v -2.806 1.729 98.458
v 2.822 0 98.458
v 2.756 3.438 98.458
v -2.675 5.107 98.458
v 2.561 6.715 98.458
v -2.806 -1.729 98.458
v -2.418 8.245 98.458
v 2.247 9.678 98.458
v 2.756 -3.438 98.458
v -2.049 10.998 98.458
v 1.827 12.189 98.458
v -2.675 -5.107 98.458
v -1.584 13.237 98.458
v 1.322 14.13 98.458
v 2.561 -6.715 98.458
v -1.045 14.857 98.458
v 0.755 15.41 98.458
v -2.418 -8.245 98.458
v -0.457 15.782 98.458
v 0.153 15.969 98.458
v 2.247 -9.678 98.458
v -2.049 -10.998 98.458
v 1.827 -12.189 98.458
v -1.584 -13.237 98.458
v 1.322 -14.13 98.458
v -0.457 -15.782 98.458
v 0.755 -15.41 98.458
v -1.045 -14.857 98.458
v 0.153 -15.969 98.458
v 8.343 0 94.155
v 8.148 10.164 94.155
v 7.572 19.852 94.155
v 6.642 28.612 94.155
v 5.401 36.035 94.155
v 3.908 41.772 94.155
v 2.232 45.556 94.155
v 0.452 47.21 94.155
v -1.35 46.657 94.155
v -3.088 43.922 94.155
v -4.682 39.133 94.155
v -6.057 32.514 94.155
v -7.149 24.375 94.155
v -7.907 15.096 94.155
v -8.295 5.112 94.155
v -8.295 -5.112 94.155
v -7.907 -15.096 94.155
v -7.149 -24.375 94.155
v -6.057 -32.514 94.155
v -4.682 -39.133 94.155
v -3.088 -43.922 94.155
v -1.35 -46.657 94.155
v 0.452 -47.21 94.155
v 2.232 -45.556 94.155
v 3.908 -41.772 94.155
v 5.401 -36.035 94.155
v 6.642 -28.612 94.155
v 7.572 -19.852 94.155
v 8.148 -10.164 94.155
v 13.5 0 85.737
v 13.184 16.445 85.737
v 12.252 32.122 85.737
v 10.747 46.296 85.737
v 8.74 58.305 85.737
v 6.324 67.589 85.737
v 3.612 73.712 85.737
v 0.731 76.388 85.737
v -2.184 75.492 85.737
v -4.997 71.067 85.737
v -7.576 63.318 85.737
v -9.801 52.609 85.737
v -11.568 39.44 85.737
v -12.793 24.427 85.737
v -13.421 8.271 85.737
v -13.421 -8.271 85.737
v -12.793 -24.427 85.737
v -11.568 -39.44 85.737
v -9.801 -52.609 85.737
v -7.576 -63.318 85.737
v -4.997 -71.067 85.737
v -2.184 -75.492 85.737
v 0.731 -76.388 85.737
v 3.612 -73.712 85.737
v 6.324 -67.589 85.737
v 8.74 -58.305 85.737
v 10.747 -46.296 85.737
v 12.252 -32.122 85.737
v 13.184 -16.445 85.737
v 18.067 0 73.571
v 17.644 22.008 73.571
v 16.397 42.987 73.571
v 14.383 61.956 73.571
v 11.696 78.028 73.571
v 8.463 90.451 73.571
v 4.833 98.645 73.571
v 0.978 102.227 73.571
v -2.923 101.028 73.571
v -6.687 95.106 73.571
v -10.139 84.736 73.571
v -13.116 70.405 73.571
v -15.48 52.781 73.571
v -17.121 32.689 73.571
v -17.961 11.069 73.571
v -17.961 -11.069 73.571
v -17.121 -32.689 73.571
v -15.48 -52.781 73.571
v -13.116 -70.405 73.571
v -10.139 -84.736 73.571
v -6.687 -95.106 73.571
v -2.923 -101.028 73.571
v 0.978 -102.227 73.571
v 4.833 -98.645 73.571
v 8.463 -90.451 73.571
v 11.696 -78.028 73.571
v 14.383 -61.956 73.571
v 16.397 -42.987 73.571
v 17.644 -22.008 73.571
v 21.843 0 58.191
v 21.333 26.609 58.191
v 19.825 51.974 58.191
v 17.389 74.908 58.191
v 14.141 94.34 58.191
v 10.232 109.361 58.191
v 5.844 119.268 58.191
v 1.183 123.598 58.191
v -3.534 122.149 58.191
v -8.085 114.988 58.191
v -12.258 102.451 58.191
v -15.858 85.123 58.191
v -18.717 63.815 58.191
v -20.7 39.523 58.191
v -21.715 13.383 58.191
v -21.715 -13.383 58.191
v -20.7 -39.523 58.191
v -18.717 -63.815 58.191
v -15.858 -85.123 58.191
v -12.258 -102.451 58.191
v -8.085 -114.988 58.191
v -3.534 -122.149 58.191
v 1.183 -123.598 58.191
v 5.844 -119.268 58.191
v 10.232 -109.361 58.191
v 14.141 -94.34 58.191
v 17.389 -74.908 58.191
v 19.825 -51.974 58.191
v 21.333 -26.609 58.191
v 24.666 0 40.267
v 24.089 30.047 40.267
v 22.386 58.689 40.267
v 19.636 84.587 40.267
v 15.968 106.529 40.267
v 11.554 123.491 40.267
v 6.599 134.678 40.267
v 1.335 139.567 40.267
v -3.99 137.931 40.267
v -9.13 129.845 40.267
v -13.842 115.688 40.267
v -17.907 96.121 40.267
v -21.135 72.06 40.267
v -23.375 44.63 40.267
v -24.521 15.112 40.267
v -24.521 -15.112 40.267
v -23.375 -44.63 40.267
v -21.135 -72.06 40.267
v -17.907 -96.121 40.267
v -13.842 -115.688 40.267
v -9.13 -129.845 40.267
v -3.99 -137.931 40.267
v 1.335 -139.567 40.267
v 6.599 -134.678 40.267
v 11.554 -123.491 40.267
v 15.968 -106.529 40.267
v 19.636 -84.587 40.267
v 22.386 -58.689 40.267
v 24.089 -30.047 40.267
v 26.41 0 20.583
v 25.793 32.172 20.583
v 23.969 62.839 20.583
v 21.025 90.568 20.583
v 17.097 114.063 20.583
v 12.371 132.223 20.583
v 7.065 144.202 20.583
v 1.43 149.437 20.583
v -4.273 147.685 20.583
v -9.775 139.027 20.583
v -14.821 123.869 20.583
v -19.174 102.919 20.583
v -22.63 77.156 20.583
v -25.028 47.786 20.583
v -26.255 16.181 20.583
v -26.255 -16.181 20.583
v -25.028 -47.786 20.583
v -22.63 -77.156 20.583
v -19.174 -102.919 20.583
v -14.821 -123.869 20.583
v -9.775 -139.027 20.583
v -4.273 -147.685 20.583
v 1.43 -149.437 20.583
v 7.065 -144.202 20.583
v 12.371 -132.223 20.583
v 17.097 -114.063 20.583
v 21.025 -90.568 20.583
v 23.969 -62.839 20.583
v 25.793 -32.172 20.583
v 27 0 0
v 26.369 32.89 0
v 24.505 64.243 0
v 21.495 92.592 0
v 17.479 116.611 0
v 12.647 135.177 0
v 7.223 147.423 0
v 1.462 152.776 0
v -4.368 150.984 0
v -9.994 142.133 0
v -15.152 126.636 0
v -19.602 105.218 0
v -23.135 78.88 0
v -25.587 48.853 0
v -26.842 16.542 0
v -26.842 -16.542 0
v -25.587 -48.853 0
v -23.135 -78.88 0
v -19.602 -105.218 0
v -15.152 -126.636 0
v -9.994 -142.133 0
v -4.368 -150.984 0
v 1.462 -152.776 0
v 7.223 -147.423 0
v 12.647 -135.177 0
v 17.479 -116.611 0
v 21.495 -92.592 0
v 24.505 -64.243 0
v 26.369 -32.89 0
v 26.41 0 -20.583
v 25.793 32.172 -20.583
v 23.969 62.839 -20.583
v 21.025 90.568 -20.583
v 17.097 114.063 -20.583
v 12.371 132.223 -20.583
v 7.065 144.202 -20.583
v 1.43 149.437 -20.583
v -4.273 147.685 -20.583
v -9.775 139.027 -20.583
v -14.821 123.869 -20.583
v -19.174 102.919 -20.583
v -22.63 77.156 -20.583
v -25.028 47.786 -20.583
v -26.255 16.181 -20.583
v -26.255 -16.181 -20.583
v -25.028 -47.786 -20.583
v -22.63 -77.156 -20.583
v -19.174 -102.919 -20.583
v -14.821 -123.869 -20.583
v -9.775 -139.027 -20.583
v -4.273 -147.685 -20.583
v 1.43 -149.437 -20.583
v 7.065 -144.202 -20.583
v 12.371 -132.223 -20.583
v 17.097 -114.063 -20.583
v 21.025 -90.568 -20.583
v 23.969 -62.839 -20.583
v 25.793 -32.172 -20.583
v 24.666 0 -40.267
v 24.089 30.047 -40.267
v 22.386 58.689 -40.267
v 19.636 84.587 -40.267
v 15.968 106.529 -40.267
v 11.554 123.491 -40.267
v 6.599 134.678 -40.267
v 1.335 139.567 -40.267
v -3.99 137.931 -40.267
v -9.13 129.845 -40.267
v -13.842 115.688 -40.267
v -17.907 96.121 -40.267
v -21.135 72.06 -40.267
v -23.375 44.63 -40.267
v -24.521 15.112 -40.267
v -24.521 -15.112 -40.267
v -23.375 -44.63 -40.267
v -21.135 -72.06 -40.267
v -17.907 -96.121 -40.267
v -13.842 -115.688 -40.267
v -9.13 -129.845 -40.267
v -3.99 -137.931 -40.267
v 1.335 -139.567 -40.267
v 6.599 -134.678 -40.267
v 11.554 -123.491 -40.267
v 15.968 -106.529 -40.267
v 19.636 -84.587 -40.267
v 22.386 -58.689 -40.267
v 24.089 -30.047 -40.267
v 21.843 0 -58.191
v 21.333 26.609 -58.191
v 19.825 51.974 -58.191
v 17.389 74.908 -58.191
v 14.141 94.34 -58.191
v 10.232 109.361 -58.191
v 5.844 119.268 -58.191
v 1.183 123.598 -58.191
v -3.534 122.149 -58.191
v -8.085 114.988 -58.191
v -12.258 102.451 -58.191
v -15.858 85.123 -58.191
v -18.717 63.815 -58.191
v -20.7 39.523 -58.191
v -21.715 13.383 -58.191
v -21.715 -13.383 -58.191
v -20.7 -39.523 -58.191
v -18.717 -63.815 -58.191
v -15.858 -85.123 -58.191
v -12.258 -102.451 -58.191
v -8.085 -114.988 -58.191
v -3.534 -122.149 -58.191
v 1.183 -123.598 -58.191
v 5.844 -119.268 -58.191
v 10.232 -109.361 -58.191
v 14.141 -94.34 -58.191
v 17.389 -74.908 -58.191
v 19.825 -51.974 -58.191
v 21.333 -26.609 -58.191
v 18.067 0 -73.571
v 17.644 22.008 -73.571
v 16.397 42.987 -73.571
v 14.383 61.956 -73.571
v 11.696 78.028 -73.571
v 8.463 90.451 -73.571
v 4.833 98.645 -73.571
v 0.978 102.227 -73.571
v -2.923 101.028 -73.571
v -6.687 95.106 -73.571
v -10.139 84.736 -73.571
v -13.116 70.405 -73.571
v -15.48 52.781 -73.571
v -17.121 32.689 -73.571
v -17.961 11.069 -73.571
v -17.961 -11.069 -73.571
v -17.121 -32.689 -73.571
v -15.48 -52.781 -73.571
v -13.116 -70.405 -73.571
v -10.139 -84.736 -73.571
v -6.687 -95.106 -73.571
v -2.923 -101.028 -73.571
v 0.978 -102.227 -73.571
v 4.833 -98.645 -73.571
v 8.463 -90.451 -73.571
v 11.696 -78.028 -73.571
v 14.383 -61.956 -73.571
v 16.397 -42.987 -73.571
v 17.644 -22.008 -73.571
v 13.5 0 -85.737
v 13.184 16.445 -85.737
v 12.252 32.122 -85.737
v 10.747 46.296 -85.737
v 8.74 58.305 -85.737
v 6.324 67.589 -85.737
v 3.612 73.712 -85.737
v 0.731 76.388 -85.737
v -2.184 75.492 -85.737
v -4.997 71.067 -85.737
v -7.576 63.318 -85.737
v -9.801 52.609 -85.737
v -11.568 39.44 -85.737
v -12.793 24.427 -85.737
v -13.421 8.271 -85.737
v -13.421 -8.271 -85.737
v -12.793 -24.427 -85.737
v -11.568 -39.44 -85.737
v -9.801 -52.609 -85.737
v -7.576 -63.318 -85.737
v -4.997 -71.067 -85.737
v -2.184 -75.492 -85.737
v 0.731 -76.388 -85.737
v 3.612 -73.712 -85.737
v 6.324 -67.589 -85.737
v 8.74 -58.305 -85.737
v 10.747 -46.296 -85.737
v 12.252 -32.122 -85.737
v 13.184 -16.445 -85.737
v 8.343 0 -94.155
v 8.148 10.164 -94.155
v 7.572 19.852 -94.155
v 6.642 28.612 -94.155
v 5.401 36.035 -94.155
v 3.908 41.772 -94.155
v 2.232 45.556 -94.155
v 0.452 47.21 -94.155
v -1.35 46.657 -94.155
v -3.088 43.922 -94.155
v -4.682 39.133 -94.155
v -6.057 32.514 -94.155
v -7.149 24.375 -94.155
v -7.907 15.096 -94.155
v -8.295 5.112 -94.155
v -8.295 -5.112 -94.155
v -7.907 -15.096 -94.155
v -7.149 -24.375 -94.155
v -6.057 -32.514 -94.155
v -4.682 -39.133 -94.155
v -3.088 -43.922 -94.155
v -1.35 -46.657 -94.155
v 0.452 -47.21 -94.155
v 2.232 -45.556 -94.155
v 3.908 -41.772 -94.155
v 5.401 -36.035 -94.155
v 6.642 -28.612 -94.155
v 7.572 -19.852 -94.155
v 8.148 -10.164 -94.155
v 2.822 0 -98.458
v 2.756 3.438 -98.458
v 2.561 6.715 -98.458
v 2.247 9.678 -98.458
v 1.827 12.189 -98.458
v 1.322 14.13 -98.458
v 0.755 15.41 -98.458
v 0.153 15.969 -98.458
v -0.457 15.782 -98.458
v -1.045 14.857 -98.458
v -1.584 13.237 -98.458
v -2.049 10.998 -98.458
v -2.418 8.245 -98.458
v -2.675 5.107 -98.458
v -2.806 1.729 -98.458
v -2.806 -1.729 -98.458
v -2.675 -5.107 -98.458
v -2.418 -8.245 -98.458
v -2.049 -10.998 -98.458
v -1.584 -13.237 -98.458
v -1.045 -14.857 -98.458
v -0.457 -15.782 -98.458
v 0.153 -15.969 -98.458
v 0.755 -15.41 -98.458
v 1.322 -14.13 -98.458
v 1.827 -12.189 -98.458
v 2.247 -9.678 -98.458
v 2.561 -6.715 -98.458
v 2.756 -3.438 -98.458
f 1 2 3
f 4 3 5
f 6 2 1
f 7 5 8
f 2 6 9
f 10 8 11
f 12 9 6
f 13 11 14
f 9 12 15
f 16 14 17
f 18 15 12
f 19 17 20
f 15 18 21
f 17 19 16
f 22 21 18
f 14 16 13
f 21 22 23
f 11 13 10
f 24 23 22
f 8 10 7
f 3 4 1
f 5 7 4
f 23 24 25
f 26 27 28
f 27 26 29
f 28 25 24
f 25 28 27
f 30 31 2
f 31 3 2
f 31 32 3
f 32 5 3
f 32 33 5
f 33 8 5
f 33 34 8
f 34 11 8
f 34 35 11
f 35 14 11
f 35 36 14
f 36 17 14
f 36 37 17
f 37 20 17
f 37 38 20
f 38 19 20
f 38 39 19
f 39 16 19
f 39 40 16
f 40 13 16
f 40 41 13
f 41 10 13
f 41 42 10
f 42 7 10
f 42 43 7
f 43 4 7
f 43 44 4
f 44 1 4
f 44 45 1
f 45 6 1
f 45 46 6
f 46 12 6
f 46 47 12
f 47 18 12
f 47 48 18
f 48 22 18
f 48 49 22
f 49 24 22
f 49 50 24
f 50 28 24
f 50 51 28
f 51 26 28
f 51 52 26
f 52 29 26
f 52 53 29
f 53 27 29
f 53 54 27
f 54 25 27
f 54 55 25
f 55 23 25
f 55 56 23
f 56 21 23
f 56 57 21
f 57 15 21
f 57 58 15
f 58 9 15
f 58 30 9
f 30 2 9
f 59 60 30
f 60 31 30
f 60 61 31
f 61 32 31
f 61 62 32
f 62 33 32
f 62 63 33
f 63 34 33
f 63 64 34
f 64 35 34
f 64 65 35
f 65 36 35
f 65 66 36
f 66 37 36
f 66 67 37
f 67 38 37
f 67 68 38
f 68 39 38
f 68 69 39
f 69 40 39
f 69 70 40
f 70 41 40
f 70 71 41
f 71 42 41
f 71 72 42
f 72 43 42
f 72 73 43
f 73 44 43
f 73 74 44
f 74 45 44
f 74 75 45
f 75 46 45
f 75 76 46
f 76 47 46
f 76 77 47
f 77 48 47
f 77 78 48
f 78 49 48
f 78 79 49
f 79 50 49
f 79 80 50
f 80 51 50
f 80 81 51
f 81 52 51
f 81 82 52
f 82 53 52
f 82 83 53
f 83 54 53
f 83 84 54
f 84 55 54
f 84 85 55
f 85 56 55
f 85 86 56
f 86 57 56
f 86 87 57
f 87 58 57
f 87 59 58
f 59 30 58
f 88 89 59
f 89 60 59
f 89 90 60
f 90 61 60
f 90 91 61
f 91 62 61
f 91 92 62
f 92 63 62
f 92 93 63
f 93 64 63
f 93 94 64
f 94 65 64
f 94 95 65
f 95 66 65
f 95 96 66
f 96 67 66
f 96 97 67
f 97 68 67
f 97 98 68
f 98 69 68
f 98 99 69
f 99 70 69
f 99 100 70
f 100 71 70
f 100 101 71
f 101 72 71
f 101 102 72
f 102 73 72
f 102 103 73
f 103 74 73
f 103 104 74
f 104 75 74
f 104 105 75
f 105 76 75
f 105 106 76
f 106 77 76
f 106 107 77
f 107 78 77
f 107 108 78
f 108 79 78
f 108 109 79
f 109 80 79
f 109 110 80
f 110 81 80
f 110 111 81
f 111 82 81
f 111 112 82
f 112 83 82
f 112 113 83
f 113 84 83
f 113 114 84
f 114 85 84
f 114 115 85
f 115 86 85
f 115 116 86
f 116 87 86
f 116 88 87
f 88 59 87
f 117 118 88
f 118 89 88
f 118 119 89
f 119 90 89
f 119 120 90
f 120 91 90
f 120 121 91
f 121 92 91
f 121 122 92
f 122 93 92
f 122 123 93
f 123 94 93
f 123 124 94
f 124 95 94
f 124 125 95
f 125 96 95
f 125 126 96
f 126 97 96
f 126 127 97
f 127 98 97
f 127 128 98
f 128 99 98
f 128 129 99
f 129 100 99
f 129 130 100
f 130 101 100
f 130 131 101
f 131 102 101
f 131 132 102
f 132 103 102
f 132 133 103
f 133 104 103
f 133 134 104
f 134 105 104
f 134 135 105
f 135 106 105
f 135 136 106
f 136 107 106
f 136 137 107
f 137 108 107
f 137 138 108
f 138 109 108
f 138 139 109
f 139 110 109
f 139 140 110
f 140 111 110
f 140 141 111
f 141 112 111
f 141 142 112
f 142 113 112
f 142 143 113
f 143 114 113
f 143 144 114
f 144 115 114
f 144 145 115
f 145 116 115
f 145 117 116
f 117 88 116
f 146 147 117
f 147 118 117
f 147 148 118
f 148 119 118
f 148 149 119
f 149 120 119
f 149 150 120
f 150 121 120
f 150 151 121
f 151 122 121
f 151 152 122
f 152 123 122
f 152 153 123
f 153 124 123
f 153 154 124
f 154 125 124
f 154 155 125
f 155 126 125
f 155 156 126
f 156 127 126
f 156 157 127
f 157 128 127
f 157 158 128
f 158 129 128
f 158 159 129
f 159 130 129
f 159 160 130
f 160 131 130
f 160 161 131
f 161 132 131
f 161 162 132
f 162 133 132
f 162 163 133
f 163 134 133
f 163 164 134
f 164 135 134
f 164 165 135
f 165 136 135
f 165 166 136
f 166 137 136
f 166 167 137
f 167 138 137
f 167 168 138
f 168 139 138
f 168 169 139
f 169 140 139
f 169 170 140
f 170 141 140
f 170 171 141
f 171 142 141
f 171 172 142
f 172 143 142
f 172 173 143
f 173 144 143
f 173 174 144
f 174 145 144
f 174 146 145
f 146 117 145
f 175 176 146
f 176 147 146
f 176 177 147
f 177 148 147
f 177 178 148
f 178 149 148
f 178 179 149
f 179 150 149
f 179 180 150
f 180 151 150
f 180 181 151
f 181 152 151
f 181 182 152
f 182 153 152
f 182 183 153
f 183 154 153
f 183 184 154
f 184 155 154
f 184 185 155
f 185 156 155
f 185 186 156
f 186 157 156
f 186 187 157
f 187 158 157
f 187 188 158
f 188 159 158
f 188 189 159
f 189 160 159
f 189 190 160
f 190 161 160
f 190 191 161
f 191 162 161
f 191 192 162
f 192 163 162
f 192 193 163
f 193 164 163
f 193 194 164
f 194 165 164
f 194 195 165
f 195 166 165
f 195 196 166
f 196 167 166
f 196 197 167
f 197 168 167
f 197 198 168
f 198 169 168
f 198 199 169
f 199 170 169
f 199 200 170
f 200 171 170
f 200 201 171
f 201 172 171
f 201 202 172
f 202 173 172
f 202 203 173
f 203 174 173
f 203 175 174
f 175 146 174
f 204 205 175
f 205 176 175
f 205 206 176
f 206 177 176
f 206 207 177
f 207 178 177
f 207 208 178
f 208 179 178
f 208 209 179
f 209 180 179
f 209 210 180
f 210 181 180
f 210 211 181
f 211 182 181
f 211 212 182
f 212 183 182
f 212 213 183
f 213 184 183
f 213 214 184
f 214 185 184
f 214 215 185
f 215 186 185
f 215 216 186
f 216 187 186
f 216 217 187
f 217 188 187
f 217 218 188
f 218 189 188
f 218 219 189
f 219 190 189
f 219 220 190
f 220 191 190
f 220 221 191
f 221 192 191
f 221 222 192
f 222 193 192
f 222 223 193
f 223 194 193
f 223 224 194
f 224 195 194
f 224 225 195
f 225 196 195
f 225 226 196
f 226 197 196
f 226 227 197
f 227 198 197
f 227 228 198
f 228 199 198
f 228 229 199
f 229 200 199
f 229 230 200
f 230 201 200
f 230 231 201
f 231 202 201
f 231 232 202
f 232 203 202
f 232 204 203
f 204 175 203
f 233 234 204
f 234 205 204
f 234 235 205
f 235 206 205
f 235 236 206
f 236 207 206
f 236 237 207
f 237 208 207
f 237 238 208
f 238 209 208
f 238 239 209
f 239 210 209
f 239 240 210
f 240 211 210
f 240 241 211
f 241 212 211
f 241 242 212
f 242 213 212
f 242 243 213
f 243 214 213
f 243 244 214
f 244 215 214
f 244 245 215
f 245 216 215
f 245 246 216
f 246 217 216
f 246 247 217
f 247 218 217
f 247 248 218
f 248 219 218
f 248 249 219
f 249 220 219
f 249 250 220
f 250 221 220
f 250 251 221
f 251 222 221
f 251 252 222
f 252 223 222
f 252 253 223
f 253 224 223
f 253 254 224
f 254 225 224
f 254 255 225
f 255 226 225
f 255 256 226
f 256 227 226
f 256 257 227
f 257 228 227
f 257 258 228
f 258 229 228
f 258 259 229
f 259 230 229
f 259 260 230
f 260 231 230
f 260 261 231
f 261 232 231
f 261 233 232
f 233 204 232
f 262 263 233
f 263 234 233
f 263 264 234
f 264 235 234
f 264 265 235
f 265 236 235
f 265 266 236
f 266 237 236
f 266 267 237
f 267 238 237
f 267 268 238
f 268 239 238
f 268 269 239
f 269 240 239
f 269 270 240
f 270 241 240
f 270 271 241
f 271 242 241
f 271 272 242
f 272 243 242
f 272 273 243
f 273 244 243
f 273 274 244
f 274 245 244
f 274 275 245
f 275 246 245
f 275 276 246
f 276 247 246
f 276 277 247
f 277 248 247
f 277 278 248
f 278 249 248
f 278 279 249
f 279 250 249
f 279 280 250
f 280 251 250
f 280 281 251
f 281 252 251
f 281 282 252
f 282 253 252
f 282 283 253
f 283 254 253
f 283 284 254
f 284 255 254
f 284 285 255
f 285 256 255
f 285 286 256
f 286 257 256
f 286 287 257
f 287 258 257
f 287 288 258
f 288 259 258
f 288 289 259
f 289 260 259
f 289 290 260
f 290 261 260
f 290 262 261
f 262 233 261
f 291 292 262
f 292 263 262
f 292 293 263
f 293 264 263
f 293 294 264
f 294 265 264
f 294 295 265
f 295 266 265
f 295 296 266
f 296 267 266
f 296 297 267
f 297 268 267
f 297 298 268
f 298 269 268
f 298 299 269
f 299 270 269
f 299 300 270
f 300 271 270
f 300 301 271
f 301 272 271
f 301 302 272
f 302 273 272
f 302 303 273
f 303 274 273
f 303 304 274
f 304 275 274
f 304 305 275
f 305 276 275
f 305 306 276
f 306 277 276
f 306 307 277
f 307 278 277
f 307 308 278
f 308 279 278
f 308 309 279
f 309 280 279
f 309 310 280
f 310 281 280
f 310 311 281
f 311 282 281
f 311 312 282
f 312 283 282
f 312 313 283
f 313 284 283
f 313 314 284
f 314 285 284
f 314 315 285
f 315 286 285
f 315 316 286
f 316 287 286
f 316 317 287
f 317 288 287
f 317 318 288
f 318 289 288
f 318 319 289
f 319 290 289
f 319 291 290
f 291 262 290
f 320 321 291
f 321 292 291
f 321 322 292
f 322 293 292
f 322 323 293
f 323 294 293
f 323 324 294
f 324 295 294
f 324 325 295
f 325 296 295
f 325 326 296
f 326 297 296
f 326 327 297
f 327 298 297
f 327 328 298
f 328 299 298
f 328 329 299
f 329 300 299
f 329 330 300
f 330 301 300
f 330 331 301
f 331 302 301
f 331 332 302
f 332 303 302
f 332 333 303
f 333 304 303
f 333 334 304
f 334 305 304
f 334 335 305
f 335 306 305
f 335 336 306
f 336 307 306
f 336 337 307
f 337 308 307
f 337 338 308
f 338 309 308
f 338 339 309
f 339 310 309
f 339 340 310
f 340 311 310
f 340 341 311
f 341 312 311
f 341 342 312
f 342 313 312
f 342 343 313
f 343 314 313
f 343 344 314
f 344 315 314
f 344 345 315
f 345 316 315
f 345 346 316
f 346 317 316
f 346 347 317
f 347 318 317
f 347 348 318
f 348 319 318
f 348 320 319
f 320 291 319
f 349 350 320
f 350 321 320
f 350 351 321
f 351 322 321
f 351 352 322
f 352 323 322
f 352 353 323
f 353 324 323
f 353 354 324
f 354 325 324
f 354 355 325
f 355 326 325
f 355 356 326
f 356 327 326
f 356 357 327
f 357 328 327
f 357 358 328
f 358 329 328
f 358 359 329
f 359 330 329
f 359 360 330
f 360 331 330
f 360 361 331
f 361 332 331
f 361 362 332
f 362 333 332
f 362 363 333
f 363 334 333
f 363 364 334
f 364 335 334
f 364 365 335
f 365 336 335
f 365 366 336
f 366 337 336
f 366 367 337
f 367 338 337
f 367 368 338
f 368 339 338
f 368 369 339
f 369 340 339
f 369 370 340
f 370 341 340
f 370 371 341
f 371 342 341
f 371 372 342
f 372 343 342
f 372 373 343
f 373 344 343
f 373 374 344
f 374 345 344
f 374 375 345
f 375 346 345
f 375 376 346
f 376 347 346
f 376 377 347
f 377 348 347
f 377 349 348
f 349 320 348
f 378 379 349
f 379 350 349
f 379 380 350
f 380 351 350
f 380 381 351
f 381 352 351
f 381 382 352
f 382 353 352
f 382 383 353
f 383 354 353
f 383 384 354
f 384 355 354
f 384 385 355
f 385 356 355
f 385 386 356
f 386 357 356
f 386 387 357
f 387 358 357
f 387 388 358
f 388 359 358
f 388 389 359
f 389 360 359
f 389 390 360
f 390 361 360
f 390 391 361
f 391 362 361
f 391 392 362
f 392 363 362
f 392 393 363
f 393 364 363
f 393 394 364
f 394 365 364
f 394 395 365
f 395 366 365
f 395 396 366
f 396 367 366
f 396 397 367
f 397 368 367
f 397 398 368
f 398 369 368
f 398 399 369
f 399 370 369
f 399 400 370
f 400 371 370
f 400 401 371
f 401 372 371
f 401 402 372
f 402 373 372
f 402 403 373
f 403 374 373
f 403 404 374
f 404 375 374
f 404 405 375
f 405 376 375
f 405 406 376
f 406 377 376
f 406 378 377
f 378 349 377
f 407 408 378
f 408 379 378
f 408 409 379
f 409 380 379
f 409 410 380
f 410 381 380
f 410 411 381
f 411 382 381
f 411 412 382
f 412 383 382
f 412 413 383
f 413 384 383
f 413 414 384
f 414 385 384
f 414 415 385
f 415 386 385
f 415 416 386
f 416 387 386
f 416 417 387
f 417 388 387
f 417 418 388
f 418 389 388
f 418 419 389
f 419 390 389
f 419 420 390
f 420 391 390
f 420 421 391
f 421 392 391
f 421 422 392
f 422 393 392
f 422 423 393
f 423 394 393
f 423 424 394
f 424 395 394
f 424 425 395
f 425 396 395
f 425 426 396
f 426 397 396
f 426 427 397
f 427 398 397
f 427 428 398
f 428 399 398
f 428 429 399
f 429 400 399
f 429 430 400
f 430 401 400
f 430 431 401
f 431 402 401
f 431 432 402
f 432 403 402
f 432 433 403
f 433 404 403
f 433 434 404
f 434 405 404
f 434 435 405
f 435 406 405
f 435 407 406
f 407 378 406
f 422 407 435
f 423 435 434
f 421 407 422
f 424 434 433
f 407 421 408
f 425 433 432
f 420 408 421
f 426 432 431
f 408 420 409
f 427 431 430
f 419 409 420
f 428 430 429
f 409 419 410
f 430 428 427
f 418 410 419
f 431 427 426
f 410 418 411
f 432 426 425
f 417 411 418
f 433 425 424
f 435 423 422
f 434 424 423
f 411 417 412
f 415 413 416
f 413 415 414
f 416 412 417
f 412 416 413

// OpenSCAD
// Generated by SolidPython 1.0.1 on 2020-07-29 00:46:46


scale(v = [3, 17, 11]) {
	sphere(r = 9);
}
/***********************************************
*********      SolidPython code:      **********
************************************************
 
# import packages: SolidPython
from solid import *
from solid.utils import *
from itertools import chain, combinations, permutations


class Resize:

    def __init__(self, scad_file):
        self.scad_file = scad_file
        #self.scad_file = import_scad(scad_file)
        # cone/cylinder param:
        self.r1 = 0
        self.r2 = 0
        self.h = 0
        # rectangular prism param:
        self.w = 0
        self.l = 0
        # ellipse param:
        self.r = 0

    # import OpenScad code (file name corresponds to shape)


    # classify shape + parameters
    def assign(self, param1, param2, param3):
        if self.scad_file == 'cone.scad':
            self.r1 = param1
            self.r2 = param2
            self.h = param3
        elif self.scad_file == 'cylinder.scad':
            self.r1 = param1
            self.r2 = param2
            self.h = param3
        elif self.scad_file == 'rectangularPrism.scad':
            self.h = param1
            self.l = param2
            self.w = param3
        else:
            self.r = param1
            self.h = param2

    # resize parameters
    def iterate(self):
        x = range(3, 20, 2)
        i = 1
        if self.scad_file == 'cone.scad':
            tempList = list(permutations(x, 2))
            for temp in tempList:
                param1 = temp[0]
                param2 = temp[1]
                filepath = 'produced_scad_files/' + 'cone' + str(param1) + '_' + str(param2) + '_' + '.scad'
                scad_render_to_file(cylinder(h=param1, r1=param2, r2=0), filepath)

        elif self.scad_file == 'cylinder.scad':
            tempList = list(permutations(x, 3))
            for temp in tempList:
                param1 = temp[0]
                param2 = temp[1]
                filepath = 'produced_scad_files/' + 'cylinder' + str(param1) + '_' + str(param2) + '_' + '.scad'
                scad_render_to_file(cylinder(h=param1, r1=param2, r2=param2), filepath)

        elif self.scad_file == 'rectangularPrism.scad':
            tempList = list(permutations(x, 3))
            for temp in tempList:
                param1 = temp[0]
                param2 = temp[1]
                param3 = temp[2]
                filepath = 'produced_scad_files/' + 'rectangularPrism' + str(param1) + '_' + str(param2) + '_' + str(
                    param3) + '.scad'
                scad_render_to_file(cube(size=(param1, param2, param3)), filepath)

        elif self.scad_file == 'ellipse.scad':
            tempList = list(permutations(x, 4))
            for temp in tempList:
                param1 = temp[0]
                param2 = temp[1]
                param3 = temp[2]
                param4 = temp[3]
                filepath = 'produced_scad_files/' + 'ellipse' + str(param1) + '_' + str(param2) + '_' + str(param3) + '_' + str(param4) + '.scad'
                scad_render_to_file(scale([param1, param2, param3])(sphere(r=param4)), filepath)

    def render_to_scadfile(self):
        scad_render_to_file(scad, 'example.scad') 
 
************************************************/
